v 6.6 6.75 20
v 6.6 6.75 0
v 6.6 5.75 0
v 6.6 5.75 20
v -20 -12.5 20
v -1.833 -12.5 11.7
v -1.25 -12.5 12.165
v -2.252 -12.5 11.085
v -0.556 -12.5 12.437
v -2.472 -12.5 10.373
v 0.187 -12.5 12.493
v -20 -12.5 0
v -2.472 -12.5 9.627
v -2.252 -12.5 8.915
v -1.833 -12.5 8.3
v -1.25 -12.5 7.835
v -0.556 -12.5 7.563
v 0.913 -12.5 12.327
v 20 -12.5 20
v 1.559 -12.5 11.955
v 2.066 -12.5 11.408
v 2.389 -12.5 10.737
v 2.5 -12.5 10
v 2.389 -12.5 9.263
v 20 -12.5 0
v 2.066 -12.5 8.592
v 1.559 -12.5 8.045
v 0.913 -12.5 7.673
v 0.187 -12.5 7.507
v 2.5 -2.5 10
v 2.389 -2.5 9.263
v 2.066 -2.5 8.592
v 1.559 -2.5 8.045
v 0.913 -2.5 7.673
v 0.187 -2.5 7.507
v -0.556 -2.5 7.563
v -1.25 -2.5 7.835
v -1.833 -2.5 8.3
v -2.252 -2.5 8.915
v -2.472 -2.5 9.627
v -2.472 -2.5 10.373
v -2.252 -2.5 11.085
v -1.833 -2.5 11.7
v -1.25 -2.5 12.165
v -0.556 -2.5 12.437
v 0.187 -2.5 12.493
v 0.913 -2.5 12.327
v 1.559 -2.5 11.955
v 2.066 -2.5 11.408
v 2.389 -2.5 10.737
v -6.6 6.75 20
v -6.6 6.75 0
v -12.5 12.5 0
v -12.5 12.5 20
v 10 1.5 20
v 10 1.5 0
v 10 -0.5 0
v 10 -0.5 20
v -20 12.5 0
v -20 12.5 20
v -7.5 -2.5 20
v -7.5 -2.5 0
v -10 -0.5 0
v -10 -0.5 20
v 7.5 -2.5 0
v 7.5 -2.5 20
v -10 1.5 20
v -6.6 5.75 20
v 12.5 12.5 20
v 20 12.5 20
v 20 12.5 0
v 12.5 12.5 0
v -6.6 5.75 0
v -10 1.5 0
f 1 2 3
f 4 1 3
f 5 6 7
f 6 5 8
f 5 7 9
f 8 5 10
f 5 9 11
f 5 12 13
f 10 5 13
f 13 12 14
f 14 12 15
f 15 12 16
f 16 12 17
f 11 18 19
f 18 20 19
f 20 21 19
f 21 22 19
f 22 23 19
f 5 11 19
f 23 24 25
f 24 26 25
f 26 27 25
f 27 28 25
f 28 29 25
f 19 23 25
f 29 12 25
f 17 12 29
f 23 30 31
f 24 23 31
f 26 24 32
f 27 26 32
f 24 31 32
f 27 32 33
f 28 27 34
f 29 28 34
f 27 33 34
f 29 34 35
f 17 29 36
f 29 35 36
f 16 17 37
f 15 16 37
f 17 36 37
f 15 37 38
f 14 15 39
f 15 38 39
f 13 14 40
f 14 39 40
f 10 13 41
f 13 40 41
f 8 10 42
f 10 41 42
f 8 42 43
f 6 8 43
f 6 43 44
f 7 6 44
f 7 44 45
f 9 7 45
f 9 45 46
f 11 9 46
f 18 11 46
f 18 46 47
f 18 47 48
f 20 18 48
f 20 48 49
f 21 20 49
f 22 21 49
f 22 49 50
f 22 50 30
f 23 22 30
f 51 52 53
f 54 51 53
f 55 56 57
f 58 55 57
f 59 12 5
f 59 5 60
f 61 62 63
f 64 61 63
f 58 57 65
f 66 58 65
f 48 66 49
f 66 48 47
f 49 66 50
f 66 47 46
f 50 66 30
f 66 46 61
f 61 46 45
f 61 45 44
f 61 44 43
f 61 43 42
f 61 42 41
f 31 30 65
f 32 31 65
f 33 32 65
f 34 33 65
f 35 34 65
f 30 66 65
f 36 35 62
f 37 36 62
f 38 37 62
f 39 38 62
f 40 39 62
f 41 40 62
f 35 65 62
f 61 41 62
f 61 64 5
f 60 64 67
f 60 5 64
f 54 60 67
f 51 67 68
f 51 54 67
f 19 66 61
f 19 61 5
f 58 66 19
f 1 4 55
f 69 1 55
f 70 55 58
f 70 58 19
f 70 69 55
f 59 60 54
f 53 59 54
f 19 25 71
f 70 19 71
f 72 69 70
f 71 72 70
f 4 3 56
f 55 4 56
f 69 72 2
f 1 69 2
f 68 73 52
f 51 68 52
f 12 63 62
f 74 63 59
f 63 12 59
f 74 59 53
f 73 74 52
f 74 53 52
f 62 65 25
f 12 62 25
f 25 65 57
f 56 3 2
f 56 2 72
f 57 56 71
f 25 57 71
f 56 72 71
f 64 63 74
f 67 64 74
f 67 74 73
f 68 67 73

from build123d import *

# Parameters (mm, degrees)
SKETCH_1_W               = 40
SKETCH_1_H               = 25
EXTRUDE_1_DEPTH          = 20
CUT_EXTRUDE_1_DEPTH      = 1
CUT_EXTRUDE_1_DEPTH_BACK = 20
HOLE_WIZARD_M6_1_D       = 5
HOLE_WIZARD_M6_1_DEPTH   = 18
HOLE_WIZARD_M6_1_TIP     = 1.502151548


with BuildPart() as part:
    # 草图1 → 凸台-拉伸1 (new body)
    with BuildSketch(Plane.XY):
        Rectangle(SKETCH_1_W, SKETCH_1_H)
    extrude(amount=EXTRUDE_1_DEPTH)

    # 草图2 → 切除-拉伸1 (cut, two sides)
    with BuildSketch(Plane(origin=(0, 0, 0), x_dir=(-1, 0, 0), z_dir=(0, 0, -1))) as cut_extrude_1_sk:
        Polygon((-78.390332326, 76.715154385), (-12.5, 12.5), (-6.6, 6.75), (-6.6, 5.75), (-10, 1.5), (-10, -0.5), (-7.5, -2.5), (7.5, -2.5), (10, -0.5), (10, 1.5), (6.6, 5.75), (6.6, 6.75), (12.5, 12.5), (78.390332326, 76.715154385), (78.390332326, 260.727349054), (-78.390332326, 260.727349054), align=None)
    extrude(amount=CUT_EXTRUDE_1_DEPTH, mode=Mode.SUBTRACT)
    extrude(cut_extrude_1_sk.sketch, amount=-CUT_EXTRUDE_1_DEPTH_BACK, mode=Mode.SUBTRACT)

    # M6 螺纹孔1
    with Locations(Plane(origin=(0, -12.5, 0), x_dir=(-1, 0, 0), z_dir=(0, -1, 0))):
        with Locations((0, -10)):
            Hole(HOLE_WIZARD_M6_1_D / 2, depth=HOLE_WIZARD_M6_1_DEPTH)
            with Locations((0, 0, -(HOLE_WIZARD_M6_1_DEPTH + HOLE_WIZARD_M6_1_TIP / 2))):  # 118° drill point
                Cone(0, HOLE_WIZARD_M6_1_D / 2, HOLE_WIZARD_M6_1_TIP, mode=Mode.SUBTRACT)


solid = part.part
